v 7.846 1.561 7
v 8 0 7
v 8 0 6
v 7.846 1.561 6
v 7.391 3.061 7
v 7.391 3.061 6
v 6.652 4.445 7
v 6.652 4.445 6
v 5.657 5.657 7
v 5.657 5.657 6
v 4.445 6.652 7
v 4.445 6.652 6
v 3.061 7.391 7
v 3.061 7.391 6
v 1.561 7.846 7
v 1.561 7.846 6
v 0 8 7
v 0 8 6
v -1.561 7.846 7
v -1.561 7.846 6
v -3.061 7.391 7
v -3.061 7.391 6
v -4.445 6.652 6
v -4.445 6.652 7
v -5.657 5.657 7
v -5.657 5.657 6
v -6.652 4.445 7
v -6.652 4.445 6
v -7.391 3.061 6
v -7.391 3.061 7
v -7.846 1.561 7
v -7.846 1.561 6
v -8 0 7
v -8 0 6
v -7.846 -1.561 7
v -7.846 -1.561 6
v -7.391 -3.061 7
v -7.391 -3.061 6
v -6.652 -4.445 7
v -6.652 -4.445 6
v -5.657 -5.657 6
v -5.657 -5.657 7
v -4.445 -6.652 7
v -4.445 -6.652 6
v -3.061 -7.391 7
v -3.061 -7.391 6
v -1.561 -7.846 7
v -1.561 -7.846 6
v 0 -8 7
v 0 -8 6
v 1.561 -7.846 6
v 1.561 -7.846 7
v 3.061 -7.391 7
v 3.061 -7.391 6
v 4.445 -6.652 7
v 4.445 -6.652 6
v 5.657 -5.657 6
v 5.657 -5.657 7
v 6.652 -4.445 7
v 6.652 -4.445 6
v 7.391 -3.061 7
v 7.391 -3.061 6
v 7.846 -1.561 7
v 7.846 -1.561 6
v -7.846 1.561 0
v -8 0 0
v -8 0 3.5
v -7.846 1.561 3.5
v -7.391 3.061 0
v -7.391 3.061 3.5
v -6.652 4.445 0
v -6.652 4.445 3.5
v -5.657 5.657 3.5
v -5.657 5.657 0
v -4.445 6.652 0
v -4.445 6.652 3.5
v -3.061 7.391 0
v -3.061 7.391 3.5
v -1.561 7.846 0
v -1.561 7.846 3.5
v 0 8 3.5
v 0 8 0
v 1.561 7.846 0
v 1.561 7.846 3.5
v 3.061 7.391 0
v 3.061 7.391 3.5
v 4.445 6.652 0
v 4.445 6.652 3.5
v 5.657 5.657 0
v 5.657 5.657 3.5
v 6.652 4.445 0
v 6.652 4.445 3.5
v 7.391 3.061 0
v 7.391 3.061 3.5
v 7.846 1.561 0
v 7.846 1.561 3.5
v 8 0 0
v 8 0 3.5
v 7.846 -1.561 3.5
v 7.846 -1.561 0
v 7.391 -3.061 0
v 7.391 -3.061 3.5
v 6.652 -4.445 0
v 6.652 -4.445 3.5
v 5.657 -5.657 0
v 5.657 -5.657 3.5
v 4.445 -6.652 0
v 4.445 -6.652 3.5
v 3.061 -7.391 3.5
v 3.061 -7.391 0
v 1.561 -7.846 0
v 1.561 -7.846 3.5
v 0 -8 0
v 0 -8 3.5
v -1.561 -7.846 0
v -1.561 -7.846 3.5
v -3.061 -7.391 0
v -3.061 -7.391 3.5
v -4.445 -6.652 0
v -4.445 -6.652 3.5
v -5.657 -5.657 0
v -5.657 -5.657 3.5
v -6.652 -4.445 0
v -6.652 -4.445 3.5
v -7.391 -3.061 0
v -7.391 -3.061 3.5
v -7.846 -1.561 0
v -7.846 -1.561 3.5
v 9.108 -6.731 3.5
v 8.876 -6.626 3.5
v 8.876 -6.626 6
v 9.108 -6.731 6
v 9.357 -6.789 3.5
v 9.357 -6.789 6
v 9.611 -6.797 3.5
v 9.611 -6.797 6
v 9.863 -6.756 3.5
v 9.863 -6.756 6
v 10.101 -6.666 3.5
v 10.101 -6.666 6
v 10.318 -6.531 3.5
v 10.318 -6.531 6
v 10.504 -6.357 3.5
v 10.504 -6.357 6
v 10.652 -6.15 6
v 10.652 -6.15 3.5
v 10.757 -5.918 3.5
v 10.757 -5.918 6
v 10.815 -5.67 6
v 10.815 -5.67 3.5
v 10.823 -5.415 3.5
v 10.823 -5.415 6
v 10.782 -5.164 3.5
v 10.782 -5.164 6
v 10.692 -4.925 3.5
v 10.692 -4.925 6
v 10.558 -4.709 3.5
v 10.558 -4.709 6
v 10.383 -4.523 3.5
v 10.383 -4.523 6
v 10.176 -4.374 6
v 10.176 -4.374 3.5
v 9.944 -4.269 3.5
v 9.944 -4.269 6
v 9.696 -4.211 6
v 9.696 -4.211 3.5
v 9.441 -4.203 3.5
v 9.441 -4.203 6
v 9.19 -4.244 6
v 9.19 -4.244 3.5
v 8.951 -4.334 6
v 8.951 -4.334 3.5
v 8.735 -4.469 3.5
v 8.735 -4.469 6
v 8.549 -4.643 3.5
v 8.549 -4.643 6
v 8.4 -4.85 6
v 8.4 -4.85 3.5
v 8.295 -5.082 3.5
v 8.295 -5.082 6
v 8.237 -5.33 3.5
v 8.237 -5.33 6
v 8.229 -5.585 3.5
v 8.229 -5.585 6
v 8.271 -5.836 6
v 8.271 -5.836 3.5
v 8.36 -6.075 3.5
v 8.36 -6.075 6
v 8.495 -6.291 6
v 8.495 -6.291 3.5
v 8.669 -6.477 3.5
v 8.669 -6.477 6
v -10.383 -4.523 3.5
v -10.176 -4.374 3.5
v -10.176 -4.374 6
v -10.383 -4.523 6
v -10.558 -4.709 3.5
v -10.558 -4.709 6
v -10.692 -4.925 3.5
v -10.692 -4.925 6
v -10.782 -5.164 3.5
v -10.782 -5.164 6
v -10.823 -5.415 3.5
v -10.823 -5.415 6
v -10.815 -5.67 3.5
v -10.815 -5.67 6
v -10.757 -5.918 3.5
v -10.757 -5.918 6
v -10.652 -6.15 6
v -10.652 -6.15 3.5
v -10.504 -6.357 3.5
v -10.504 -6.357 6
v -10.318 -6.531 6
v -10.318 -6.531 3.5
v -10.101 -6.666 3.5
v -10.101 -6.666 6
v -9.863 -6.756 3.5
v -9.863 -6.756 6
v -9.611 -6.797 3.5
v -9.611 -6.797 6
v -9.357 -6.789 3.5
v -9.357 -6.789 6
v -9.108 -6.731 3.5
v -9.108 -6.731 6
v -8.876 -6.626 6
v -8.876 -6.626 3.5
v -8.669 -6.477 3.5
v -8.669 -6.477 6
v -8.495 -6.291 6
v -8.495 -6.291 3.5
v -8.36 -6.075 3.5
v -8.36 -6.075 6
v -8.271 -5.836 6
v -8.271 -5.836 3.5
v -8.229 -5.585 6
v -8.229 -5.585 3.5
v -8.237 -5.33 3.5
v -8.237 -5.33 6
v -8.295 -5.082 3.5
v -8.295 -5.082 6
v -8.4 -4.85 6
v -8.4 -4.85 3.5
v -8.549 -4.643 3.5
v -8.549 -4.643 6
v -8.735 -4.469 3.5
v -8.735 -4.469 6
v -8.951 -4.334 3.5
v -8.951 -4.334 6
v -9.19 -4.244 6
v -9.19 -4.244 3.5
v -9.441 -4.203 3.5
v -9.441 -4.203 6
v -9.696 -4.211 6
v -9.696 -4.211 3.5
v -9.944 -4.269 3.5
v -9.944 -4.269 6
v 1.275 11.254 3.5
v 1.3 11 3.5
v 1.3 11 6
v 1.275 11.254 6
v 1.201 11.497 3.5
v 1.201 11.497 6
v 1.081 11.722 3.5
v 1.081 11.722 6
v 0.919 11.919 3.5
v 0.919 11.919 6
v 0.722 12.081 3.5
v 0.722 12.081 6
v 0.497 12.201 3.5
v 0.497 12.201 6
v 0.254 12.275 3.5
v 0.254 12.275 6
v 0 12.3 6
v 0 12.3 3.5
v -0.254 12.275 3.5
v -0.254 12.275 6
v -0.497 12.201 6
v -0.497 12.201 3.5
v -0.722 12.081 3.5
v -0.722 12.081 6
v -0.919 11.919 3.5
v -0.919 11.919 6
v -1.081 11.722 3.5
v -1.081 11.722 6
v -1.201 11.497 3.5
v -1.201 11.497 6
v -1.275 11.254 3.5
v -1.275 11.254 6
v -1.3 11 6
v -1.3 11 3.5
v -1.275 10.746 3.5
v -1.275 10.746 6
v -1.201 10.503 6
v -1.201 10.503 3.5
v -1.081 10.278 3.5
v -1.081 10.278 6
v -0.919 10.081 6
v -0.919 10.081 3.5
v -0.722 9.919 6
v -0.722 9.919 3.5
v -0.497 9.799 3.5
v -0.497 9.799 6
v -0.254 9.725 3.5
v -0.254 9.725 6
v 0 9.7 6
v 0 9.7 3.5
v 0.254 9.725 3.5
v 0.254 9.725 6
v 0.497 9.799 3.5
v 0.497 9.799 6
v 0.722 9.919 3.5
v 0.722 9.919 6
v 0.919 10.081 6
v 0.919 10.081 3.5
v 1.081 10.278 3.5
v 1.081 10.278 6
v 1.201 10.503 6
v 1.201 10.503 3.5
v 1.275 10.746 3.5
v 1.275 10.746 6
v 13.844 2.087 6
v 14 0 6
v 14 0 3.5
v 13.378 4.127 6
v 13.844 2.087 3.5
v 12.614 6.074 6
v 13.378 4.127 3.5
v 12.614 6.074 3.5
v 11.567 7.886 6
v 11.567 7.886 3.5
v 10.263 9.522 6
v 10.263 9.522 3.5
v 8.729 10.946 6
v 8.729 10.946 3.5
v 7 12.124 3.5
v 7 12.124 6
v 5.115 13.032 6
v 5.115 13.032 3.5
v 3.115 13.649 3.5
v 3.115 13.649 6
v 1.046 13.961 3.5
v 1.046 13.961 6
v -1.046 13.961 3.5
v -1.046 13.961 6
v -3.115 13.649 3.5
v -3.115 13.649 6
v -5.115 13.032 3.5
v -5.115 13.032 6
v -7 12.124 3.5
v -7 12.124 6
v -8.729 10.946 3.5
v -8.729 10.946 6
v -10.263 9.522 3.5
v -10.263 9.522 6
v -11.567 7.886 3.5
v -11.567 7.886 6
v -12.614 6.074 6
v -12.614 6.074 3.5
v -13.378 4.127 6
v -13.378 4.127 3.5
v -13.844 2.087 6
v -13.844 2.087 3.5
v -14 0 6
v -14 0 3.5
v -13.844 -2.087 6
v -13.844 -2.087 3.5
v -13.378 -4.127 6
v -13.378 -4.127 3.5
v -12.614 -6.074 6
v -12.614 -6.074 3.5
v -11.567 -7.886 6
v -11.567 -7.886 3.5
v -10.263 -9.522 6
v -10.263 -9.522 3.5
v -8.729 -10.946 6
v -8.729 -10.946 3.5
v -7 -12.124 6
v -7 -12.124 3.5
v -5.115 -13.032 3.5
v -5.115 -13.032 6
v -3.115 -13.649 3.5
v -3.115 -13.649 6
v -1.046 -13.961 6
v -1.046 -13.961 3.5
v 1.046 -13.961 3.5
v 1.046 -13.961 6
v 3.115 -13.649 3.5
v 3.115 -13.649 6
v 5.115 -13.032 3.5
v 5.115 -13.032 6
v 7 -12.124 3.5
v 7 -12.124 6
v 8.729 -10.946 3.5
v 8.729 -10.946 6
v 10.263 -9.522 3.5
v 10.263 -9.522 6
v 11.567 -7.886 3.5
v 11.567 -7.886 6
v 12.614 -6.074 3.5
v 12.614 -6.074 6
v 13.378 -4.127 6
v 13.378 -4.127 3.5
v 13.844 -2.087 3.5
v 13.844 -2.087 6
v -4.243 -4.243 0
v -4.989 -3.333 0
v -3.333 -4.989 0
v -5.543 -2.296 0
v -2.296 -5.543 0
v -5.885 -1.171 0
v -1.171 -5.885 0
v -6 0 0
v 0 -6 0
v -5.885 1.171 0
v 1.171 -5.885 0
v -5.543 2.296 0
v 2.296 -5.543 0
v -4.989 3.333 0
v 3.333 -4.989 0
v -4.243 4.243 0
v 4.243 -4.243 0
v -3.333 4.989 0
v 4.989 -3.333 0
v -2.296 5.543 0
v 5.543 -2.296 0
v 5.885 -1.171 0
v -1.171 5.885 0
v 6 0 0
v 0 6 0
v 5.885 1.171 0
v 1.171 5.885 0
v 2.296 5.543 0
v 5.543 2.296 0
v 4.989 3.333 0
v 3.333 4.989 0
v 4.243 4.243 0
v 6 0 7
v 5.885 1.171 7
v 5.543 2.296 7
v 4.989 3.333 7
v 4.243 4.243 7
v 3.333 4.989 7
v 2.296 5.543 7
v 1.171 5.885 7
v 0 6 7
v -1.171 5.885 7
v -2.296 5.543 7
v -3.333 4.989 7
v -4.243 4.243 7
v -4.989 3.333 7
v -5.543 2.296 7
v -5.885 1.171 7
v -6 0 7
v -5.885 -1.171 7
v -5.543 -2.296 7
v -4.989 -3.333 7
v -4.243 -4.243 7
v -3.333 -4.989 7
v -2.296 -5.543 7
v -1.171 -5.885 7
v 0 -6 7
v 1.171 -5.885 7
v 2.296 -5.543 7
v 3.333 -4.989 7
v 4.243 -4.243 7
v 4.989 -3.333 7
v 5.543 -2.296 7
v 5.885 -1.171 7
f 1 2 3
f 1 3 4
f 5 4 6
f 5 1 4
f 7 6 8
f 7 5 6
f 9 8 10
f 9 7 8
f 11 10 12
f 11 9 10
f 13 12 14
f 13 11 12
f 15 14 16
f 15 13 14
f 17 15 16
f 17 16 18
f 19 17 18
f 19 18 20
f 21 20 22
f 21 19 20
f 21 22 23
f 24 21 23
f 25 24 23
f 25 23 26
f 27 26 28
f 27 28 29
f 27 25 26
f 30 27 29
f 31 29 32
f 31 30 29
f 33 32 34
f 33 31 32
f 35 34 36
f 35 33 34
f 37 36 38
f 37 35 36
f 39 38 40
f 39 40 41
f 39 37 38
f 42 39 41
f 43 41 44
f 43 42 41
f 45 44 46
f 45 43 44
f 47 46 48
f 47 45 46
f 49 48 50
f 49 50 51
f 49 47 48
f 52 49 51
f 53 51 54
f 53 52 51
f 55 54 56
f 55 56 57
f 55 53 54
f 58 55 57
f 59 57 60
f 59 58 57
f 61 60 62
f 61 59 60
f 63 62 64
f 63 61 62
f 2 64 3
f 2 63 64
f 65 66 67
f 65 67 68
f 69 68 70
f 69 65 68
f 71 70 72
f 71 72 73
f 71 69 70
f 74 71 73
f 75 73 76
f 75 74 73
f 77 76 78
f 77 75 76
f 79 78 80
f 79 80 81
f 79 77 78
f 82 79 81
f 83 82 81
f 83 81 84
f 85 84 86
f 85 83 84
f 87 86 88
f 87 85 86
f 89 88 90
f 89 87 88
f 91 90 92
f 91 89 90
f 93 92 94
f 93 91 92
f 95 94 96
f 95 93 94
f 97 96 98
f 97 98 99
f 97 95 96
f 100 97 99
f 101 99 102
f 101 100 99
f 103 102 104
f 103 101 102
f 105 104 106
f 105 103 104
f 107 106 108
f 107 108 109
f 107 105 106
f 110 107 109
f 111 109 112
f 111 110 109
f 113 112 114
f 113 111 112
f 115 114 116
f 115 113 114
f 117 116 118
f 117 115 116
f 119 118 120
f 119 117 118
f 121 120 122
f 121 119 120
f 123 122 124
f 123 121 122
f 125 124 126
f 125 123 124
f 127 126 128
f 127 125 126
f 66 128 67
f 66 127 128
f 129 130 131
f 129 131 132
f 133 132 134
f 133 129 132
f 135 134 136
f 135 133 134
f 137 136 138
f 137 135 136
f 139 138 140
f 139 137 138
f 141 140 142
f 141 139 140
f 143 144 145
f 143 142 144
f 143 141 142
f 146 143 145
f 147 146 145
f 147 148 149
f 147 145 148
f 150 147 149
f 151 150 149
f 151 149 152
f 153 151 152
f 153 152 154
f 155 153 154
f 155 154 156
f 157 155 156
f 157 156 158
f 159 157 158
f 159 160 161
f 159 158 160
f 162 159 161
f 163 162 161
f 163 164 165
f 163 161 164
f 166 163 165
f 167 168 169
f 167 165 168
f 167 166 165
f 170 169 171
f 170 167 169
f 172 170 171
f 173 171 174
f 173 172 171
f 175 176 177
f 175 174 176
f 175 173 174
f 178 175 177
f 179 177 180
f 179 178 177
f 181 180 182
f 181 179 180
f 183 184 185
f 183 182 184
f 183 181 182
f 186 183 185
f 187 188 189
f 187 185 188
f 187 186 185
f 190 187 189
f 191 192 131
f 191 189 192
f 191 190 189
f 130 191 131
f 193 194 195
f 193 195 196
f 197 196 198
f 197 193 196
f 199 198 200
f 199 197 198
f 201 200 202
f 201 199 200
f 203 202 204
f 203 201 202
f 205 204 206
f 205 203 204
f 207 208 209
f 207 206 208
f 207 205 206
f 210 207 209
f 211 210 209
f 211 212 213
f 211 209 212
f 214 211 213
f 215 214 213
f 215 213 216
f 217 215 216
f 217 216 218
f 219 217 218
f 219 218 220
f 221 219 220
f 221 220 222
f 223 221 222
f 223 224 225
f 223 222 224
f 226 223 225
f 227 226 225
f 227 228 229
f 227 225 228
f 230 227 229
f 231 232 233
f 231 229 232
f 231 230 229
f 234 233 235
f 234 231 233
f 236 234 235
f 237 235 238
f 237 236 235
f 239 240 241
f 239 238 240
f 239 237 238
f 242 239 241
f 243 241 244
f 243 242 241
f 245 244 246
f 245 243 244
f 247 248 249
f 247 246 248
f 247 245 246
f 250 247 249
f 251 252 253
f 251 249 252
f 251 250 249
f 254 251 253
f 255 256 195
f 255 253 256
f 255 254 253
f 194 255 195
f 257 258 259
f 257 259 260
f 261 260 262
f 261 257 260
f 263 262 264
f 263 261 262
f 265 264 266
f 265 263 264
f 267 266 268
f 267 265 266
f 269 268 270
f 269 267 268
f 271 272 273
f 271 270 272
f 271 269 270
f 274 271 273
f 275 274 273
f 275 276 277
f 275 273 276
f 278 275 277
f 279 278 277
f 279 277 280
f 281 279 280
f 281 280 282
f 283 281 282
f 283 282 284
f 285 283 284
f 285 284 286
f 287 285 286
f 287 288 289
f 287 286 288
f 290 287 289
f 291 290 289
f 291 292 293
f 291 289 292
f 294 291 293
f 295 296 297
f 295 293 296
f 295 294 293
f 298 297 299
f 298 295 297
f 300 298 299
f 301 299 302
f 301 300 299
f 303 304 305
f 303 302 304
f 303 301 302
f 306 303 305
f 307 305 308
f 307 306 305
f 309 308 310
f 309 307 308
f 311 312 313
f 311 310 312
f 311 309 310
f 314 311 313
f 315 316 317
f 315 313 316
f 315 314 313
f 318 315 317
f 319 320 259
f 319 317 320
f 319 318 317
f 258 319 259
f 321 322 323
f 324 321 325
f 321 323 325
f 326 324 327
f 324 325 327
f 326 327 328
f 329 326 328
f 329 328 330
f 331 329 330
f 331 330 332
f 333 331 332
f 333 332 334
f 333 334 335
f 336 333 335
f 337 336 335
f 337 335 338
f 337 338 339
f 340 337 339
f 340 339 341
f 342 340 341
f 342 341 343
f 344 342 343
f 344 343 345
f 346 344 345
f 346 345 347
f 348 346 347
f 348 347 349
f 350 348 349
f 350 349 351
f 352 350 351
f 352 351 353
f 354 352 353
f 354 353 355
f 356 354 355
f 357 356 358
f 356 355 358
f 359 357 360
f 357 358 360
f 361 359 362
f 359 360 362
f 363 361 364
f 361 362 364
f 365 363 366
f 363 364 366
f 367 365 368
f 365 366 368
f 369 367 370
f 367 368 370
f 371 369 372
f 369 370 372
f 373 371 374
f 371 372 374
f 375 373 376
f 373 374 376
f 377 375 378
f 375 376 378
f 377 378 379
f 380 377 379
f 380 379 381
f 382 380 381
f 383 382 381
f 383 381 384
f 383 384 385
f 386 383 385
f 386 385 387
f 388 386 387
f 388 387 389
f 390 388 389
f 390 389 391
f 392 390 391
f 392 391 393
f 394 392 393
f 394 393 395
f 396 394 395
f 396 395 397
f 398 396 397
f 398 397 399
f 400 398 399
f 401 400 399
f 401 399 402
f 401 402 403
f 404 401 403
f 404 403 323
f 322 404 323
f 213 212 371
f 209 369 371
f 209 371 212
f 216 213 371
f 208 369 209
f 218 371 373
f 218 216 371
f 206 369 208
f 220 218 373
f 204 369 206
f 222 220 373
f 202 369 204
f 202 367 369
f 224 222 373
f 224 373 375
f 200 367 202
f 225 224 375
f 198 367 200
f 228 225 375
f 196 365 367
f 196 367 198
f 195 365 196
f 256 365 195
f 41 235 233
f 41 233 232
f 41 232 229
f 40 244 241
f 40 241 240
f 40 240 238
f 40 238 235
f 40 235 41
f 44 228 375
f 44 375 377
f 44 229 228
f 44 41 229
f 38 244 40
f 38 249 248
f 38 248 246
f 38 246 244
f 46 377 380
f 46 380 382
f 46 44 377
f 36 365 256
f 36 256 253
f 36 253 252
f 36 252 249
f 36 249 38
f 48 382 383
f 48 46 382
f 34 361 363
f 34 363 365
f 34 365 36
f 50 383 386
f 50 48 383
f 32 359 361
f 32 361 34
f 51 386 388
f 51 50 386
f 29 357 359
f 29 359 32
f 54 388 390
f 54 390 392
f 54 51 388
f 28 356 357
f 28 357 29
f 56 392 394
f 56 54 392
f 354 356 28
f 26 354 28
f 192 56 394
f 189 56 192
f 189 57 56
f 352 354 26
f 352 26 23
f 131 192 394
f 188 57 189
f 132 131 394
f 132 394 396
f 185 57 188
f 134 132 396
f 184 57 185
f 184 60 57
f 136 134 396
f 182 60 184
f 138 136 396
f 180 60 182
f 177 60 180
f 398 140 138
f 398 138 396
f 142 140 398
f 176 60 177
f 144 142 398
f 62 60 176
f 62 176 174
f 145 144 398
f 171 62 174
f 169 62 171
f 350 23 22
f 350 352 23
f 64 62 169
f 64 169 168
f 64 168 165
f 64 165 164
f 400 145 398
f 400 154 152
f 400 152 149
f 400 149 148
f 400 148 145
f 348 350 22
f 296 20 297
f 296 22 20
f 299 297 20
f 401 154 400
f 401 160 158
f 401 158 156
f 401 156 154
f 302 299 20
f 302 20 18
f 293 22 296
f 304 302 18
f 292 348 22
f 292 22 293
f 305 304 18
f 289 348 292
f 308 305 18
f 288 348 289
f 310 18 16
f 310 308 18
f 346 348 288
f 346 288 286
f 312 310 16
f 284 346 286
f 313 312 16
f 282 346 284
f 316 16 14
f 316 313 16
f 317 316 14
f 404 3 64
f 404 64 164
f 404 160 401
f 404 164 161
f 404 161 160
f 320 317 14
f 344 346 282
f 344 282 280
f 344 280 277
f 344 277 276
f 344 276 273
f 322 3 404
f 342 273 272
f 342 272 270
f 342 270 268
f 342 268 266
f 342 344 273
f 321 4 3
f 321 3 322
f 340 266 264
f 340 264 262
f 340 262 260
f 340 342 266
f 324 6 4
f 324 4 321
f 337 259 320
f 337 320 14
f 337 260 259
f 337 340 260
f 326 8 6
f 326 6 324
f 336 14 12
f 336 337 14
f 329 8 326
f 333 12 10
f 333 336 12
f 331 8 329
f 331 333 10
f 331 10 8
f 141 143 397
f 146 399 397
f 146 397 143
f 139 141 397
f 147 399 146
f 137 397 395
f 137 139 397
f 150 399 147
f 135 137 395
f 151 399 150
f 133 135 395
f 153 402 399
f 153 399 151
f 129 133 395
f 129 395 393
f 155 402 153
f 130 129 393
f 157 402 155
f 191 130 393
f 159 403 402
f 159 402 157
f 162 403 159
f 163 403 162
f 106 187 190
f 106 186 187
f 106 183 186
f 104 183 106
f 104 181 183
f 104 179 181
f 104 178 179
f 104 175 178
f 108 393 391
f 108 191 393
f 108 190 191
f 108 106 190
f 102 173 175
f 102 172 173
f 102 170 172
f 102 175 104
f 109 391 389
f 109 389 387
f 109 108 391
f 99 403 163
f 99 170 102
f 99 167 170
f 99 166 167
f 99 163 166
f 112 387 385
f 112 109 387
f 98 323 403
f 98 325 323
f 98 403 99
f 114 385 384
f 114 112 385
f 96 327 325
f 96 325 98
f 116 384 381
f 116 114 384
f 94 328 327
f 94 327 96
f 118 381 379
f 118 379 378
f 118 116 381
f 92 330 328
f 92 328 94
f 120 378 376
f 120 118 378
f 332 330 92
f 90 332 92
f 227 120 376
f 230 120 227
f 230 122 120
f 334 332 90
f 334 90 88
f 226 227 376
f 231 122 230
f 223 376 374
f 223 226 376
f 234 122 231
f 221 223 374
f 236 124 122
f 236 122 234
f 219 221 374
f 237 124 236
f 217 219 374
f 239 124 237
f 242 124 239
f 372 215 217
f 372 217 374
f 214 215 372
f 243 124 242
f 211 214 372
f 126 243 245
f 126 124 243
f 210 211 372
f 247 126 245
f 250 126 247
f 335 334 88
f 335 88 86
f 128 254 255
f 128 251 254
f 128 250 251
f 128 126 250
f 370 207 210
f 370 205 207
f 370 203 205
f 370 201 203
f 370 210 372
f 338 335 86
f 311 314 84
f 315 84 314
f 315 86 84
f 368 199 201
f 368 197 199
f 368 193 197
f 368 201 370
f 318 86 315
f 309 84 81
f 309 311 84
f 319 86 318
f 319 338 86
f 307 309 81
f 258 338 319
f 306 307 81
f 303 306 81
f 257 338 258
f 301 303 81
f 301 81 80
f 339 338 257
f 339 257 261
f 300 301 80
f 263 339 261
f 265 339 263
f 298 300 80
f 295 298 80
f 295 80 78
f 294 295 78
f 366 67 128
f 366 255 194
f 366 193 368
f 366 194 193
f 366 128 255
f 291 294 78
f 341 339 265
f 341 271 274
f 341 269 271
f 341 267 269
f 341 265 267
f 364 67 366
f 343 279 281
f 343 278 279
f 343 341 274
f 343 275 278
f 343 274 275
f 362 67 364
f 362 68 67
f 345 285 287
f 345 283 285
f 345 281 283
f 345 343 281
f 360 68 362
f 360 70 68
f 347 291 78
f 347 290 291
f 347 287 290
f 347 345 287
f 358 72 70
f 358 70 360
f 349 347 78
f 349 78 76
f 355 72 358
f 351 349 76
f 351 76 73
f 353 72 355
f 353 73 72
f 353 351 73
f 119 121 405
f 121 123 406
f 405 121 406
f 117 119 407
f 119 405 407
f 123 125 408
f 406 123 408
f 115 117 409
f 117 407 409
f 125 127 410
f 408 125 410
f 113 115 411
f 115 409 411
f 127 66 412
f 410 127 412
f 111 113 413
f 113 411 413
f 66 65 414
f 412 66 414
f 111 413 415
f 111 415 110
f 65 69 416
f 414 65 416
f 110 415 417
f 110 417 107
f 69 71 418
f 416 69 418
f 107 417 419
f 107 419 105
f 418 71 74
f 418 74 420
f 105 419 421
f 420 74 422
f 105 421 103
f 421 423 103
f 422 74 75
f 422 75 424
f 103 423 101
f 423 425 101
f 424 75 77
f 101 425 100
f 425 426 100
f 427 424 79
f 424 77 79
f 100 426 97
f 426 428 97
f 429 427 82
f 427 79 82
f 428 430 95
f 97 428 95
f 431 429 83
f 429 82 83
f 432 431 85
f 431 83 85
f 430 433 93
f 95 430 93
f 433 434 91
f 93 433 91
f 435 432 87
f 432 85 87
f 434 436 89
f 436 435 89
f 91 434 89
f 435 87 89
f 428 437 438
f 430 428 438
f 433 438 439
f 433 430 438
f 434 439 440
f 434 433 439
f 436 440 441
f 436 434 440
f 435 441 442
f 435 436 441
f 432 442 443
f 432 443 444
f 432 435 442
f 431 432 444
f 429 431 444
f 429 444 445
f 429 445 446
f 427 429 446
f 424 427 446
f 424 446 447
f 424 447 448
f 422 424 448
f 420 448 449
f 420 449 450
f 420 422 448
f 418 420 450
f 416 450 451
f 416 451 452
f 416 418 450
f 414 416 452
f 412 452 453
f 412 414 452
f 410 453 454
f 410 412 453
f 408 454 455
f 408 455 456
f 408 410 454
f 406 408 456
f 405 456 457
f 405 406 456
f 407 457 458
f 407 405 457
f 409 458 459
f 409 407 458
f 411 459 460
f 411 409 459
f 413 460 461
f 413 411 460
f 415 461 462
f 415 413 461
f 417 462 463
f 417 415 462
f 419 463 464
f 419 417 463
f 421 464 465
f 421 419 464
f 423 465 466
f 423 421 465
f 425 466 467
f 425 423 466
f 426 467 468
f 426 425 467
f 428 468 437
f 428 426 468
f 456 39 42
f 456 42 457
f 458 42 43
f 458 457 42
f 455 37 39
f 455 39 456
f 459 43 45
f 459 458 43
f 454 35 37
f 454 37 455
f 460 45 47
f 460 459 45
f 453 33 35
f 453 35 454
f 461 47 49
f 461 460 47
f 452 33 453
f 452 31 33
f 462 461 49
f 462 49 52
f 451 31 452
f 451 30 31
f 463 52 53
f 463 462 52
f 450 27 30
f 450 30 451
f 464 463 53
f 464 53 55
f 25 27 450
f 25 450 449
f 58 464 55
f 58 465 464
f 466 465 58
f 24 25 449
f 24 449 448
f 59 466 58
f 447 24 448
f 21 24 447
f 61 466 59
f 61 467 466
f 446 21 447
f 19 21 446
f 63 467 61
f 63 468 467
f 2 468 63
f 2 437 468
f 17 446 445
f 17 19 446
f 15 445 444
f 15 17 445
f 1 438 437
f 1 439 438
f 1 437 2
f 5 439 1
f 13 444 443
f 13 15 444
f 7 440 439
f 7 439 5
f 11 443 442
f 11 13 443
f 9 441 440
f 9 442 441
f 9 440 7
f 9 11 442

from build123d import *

# Parameters (mm, degrees)
ESQUISSE1_R                  = 14
ESQUISSE1_R_2                = 6
BOSS_EXTRU_1_DEPTH           = 7
ESQUISSE2_R                  = 14
ESQUISSE2_R_2                = 8
ENL_V_MAT_EXTRU_1_DEPTH      = 1
ESQUISSE3_OUTSIDE_W          = 38.042
ESQUISSE3_OUTSIDE_H          = 38.042
ESQUISSE3_OUTSIDE_R          = 8
ENL_V_MAT_EXTRU_2_DEPTH      = 3.5
ESQUISSE4_R                  = 1.3
ENL_V_MAT_EXTRU_3_DEPTH      = 8
R_P_TITION_CIRCULAIRE1_COUNT = 3


with BuildPart() as part:
    # Esquisse1 → Boss.-Extru.1 (new body)
    with BuildSketch(Plane.XY):
        Circle(ESQUISSE1_R)
        Circle(ESQUISSE1_R_2, mode=Mode.SUBTRACT)
    extrude(amount=BOSS_EXTRU_1_DEPTH)

    # Esquisse2 → Enlèv. mat.-Extru.1 (cut)
    with BuildSketch(Plane.XY.offset(7)):
        Circle(ESQUISSE2_R)
        Circle(ESQUISSE2_R_2, mode=Mode.SUBTRACT)
    extrude(amount=-ENL_V_MAT_EXTRU_1_DEPTH, mode=Mode.SUBTRACT)

    # Esquisse3 outside → Enlèv. mat.-Extru.2 (cut)
    with BuildSketch(Plane(origin=(0, 0, 0), x_dir=(-1, 0, 0), z_dir=(0, 0, -1))):
        Rectangle(ESQUISSE3_OUTSIDE_W, ESQUISSE3_OUTSIDE_H)
        Circle(ESQUISSE3_OUTSIDE_R, mode=Mode.SUBTRACT)
    extrude(amount=-ENL_V_MAT_EXTRU_2_DEPTH, mode=Mode.SUBTRACT)

    # Esquisse4 → Enlèv. mat.-Extru.3 (cut)
    with BuildSketch(Plane.XY):
        with Locations((0, 11)):
            Circle(ESQUISSE4_R)
    enl_v_mat_extru_3 = extrude(amount=ENL_V_MAT_EXTRU_3_DEPTH, mode=Mode.SUBTRACT)

    # Répétition circulaire1: Enlèv. mat.-Extru.3 ×3 about axis
    r_p_tition_circulaire1_axis = Axis((0, 0, 0), (0, 0, 1))
    for i in range(1, R_P_TITION_CIRCULAIRE1_COUNT):
        add(enl_v_mat_extru_3.rotate(r_p_tition_circulaire1_axis, i * 360 / R_P_TITION_CIRCULAIRE1_COUNT), mode=Mode.SUBTRACT)


solid = part.part
